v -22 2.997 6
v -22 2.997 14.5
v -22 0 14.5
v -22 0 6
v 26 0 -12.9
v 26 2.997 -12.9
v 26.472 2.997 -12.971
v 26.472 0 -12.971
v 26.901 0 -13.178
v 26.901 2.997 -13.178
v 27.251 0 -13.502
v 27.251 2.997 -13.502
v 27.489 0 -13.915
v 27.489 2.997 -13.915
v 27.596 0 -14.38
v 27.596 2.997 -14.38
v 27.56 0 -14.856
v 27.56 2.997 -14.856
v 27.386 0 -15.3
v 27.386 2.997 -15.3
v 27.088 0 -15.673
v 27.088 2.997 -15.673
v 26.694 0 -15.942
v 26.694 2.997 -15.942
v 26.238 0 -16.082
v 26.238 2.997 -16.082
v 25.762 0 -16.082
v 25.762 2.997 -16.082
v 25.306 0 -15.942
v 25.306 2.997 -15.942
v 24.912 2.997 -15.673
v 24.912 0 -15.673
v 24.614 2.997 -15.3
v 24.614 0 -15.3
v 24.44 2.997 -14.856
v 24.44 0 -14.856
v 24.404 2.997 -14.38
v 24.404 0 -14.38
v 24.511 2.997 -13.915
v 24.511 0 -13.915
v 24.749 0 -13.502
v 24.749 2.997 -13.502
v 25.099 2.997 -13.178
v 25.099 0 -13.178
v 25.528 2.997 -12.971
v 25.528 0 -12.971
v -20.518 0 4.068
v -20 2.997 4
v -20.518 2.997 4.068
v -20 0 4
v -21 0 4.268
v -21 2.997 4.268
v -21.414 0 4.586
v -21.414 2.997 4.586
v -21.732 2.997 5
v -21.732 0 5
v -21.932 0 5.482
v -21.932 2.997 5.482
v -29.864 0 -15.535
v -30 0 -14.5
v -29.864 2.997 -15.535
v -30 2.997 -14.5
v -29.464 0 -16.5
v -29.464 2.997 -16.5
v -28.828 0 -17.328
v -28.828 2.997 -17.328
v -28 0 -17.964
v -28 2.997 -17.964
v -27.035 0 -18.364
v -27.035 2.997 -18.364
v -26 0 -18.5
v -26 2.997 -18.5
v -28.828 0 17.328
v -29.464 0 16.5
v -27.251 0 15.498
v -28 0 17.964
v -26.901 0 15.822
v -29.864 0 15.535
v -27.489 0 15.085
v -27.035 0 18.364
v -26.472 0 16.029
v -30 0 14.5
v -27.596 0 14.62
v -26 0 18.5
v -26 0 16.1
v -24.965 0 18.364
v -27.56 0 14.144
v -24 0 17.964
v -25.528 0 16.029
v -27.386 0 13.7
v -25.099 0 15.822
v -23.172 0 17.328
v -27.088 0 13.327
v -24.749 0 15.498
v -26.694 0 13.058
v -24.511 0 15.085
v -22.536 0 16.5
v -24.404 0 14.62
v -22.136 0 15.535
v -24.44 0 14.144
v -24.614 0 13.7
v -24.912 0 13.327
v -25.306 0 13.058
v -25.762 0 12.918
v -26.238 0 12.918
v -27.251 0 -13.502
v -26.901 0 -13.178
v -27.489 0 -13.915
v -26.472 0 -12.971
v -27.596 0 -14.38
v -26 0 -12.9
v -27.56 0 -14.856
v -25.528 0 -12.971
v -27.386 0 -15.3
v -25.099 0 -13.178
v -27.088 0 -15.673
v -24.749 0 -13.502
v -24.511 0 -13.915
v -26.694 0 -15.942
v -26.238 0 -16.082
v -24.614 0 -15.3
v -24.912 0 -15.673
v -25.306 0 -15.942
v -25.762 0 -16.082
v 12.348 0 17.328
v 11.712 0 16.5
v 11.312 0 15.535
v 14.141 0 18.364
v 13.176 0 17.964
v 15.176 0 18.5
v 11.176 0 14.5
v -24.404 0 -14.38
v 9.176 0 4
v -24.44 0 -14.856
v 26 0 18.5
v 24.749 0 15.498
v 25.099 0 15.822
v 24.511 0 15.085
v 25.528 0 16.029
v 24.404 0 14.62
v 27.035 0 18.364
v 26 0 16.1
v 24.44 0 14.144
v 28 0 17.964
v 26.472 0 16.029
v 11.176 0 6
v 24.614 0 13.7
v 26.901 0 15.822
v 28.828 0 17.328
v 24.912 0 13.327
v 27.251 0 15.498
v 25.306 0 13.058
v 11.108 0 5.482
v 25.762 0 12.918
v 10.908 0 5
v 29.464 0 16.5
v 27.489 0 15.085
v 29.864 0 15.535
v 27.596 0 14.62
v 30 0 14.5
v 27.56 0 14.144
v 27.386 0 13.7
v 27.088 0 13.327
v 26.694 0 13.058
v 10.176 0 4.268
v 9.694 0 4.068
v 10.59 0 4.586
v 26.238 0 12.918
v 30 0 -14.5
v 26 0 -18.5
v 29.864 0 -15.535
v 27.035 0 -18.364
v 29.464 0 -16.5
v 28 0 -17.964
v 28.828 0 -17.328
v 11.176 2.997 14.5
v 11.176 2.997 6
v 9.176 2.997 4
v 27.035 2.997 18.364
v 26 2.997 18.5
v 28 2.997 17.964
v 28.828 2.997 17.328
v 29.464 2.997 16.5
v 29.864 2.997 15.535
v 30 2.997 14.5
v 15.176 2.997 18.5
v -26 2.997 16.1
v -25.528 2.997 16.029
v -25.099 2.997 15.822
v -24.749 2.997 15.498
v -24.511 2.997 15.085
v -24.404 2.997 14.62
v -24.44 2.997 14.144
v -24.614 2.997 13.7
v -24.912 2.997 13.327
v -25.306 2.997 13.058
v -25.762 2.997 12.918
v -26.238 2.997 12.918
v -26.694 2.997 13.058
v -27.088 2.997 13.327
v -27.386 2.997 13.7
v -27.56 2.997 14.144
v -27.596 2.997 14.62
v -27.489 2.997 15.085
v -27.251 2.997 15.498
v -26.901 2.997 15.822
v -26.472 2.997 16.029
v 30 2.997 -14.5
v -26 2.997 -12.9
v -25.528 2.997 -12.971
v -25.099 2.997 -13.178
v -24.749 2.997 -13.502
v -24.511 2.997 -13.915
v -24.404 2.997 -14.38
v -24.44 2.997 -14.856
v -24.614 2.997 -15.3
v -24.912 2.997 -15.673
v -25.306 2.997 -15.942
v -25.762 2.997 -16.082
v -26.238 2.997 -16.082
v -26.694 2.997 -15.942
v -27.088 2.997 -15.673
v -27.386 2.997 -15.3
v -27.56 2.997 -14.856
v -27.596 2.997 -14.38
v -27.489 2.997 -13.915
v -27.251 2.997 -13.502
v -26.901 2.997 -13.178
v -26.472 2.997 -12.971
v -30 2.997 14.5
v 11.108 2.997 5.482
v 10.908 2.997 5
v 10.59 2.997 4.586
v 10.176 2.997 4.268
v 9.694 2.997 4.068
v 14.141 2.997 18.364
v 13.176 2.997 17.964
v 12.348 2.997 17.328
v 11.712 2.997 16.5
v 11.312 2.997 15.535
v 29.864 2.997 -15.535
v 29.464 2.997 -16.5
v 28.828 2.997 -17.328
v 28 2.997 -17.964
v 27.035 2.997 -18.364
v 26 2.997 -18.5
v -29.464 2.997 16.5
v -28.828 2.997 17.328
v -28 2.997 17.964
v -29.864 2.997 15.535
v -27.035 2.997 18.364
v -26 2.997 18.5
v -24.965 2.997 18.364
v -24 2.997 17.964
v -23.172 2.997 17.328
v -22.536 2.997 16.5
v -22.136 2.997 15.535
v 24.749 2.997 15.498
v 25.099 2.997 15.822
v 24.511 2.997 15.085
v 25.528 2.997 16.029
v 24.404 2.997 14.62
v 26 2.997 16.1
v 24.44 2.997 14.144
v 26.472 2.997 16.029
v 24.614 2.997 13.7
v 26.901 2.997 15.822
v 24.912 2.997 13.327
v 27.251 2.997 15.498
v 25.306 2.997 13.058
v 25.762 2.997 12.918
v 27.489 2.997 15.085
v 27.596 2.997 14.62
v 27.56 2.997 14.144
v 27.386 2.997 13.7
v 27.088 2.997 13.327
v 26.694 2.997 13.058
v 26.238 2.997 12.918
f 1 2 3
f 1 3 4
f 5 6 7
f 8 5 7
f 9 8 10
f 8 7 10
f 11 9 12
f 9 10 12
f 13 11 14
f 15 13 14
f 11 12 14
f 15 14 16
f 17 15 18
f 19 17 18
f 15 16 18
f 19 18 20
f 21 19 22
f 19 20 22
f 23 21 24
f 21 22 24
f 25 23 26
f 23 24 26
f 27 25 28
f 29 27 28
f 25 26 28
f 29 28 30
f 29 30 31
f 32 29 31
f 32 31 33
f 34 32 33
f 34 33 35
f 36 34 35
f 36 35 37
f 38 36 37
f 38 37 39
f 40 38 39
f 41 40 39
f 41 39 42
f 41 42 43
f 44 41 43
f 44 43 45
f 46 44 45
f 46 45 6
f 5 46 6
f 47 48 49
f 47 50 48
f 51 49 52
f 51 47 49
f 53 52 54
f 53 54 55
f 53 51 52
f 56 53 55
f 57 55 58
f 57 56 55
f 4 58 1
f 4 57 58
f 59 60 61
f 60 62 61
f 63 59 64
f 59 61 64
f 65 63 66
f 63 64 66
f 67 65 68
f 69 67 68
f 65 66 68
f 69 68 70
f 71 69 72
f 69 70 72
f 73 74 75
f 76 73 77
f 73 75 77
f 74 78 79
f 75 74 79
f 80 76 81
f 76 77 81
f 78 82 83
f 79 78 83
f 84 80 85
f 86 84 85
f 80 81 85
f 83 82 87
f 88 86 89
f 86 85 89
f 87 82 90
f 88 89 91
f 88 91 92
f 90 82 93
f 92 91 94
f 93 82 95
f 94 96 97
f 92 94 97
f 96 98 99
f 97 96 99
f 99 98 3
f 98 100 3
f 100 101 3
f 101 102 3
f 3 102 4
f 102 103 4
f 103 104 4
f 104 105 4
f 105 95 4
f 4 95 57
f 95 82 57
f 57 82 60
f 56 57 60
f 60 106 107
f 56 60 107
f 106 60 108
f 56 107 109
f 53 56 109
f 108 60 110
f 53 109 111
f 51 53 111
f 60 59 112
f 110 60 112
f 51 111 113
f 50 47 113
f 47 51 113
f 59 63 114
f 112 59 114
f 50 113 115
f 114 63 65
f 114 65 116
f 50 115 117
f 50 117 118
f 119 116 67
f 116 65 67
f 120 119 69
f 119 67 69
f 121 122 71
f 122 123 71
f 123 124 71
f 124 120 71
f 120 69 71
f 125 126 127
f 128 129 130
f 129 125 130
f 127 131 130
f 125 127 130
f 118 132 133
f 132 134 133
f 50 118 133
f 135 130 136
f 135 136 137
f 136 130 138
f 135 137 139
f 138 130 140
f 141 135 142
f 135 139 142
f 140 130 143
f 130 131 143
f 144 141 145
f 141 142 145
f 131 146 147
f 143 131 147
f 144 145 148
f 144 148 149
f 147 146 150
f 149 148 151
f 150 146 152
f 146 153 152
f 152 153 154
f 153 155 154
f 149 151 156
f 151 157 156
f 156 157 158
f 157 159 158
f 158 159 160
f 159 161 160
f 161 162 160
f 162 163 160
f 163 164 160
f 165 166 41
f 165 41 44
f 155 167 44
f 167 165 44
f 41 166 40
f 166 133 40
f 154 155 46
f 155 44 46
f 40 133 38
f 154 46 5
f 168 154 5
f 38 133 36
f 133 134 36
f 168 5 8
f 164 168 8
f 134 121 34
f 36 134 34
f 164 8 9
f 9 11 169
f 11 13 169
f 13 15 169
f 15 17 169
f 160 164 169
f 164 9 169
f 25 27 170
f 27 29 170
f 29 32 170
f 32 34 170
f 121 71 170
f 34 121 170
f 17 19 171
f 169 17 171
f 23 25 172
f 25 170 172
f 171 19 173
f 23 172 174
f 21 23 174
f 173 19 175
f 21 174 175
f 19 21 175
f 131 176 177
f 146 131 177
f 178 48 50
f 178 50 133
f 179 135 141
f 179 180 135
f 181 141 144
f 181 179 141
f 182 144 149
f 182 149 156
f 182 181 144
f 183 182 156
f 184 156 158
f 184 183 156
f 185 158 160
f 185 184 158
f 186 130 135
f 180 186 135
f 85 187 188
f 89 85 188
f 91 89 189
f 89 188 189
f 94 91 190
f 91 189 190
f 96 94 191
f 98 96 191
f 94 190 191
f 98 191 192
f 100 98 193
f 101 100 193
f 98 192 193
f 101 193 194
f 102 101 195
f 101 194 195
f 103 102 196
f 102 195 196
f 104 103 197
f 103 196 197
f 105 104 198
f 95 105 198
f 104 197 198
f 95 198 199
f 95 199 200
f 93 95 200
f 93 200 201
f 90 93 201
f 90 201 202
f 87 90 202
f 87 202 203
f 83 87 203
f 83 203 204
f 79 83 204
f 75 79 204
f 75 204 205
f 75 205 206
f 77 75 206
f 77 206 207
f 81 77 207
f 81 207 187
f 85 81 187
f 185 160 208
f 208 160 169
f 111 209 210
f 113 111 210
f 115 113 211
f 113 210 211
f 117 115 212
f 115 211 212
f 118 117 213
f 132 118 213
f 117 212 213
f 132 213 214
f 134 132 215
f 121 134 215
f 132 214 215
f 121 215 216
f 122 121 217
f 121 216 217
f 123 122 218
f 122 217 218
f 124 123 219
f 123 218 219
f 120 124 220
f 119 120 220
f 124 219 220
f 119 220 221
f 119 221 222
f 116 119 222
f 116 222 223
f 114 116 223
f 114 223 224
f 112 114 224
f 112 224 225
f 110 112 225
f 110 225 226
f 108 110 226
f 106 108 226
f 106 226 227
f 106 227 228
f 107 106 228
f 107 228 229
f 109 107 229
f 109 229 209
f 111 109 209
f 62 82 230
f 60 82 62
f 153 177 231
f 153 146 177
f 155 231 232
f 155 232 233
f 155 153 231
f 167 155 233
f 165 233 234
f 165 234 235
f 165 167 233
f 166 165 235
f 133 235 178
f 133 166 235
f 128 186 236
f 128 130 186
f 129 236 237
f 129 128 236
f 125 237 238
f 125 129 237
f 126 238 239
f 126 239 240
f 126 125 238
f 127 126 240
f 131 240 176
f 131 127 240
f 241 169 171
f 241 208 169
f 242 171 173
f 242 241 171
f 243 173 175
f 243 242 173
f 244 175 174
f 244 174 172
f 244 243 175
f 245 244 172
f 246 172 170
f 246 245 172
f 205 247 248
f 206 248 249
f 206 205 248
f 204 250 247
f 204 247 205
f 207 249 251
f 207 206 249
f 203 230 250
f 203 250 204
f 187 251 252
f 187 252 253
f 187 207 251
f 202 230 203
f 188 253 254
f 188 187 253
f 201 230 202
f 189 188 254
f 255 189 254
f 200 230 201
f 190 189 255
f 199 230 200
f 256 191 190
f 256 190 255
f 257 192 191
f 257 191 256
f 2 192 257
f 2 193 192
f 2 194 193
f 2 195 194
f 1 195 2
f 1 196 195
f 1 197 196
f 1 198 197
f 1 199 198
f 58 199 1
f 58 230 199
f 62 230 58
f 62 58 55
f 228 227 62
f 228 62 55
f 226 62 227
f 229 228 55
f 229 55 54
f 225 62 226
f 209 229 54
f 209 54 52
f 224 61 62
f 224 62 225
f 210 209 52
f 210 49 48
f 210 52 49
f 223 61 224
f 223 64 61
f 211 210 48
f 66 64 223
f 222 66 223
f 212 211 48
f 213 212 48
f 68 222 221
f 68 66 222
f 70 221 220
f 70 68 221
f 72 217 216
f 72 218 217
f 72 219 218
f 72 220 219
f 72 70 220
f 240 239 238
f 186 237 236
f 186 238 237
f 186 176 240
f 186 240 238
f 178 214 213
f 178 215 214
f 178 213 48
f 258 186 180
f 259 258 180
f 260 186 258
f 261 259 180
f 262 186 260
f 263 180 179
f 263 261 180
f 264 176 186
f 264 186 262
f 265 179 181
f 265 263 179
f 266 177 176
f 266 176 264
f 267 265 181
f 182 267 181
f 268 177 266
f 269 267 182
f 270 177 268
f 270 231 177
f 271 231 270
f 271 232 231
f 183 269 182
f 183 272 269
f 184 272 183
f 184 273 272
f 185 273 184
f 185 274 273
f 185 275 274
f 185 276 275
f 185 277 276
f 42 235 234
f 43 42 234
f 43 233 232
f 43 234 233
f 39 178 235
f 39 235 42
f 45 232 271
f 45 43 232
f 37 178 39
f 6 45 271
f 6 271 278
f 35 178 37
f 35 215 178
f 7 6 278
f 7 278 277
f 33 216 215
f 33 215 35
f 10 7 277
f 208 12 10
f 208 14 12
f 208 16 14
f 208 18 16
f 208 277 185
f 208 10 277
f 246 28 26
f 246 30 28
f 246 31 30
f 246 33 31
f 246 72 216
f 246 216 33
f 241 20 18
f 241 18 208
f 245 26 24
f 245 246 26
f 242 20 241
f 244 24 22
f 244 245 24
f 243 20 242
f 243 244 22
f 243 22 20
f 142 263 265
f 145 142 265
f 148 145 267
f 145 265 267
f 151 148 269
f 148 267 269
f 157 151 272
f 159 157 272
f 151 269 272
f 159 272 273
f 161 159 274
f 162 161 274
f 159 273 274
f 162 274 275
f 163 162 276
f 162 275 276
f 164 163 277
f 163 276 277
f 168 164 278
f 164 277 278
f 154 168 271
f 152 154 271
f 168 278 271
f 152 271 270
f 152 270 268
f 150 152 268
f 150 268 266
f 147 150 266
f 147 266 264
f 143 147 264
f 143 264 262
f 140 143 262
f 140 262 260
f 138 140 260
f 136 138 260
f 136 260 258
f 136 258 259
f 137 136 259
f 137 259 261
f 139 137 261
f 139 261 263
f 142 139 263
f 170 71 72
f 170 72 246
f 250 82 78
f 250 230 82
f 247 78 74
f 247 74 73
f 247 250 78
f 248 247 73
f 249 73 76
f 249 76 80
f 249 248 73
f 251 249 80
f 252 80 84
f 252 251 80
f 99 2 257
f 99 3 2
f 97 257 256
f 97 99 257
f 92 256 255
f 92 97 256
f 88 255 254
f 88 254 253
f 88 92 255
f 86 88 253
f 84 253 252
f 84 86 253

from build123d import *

# Parameters (mm, degrees)
SKETCH1_W           = 60
SKETCH1_H           = 37
BOSS_EXTRUDE1_DEPTH = 2.9972
FILLET1_R           = 4
SKETCH2_R           = 1.6
CUT_EXTRUDE1_DEPTH  = 36.372774952
SKETCH3_W           = 33.176
SKETCH3_H           = 14.5
CUT_EXTRUDE2_DEPTH  = 36.372774952
FILLET2_R           = 4
FILLET3_R           = 2


with BuildPart() as part:
    # Sketch1 → Boss-Extrude1 (new body)
    with BuildSketch(Plane(origin=(0, 0, 0), x_dir=(1, 0, 0), z_dir=(0, 1, 0))):
        Rectangle(SKETCH1_W, SKETCH1_H)
    extrude(amount=BOSS_EXTRUDE1_DEPTH)

    # Fillet1
    fillet1_edges = [part.edges().sort_by_distance(p)[0] for p in [
        (30, 1.4986, 18.5),
        (-30, 1.4986, 18.5),
        (-30, 1.4986, -18.5),
        (30, 1.4986, -18.5),
    ]]
    fillet(fillet1_edges, radius=FILLET1_R)

    # Sketch2 → Cut-Extrude1 (cut, through all)
    with BuildSketch(Plane(origin=(0, 2.9972, 0), x_dir=(1, 0, 0), z_dir=(0, 1, 0))):
        with Locations(Location((-26, 14.5, 0), (0, 0, 270))):
            Circle(SKETCH2_R)
        with Locations(Location((-26, -14.5, 0), (0, 0, 270))):
            Circle(SKETCH2_R)
        with Locations(Location((26, -14.5, 0), (0, 0, 270))):
            Circle(SKETCH2_R)
        with Locations(Location((26, 14.5, 0), (0, 0, 270))):
            Circle(SKETCH2_R)
    extrude(amount=-CUT_EXTRUDE1_DEPTH, mode=Mode.SUBTRACT)

    # Sketch3 → Cut-Extrude2 (cut, through all)
    with BuildSketch(Plane(origin=(0, 2.9972, 0), x_dir=(1, 0, 0), z_dir=(0, 1, 0))):
        with Locations((-5.412, -11.25)):
            Rectangle(SKETCH3_W, SKETCH3_H)
    extrude(amount=-CUT_EXTRUDE2_DEPTH, mode=Mode.SUBTRACT)

    # Fillet2
    fillet2_edges = [part.edges().sort_by_distance(p)[0] for p in [
        (11.176, 1.4986, 18.5),
        (-22, 1.4986, 18.5),
    ]]
    fillet(fillet2_edges, radius=FILLET2_R - 0.0001)  # a hair under: the kernel refuses the full size

    # Fillet3
    fillet3_edges = [part.edges().sort_by_distance(p)[0] for p in [
        (11.176, 1.4986, 4),
        (-22, 1.4986, 4),
    ]]
    fillet(fillet3_edges, radius=FILLET3_R)


solid = part.part
